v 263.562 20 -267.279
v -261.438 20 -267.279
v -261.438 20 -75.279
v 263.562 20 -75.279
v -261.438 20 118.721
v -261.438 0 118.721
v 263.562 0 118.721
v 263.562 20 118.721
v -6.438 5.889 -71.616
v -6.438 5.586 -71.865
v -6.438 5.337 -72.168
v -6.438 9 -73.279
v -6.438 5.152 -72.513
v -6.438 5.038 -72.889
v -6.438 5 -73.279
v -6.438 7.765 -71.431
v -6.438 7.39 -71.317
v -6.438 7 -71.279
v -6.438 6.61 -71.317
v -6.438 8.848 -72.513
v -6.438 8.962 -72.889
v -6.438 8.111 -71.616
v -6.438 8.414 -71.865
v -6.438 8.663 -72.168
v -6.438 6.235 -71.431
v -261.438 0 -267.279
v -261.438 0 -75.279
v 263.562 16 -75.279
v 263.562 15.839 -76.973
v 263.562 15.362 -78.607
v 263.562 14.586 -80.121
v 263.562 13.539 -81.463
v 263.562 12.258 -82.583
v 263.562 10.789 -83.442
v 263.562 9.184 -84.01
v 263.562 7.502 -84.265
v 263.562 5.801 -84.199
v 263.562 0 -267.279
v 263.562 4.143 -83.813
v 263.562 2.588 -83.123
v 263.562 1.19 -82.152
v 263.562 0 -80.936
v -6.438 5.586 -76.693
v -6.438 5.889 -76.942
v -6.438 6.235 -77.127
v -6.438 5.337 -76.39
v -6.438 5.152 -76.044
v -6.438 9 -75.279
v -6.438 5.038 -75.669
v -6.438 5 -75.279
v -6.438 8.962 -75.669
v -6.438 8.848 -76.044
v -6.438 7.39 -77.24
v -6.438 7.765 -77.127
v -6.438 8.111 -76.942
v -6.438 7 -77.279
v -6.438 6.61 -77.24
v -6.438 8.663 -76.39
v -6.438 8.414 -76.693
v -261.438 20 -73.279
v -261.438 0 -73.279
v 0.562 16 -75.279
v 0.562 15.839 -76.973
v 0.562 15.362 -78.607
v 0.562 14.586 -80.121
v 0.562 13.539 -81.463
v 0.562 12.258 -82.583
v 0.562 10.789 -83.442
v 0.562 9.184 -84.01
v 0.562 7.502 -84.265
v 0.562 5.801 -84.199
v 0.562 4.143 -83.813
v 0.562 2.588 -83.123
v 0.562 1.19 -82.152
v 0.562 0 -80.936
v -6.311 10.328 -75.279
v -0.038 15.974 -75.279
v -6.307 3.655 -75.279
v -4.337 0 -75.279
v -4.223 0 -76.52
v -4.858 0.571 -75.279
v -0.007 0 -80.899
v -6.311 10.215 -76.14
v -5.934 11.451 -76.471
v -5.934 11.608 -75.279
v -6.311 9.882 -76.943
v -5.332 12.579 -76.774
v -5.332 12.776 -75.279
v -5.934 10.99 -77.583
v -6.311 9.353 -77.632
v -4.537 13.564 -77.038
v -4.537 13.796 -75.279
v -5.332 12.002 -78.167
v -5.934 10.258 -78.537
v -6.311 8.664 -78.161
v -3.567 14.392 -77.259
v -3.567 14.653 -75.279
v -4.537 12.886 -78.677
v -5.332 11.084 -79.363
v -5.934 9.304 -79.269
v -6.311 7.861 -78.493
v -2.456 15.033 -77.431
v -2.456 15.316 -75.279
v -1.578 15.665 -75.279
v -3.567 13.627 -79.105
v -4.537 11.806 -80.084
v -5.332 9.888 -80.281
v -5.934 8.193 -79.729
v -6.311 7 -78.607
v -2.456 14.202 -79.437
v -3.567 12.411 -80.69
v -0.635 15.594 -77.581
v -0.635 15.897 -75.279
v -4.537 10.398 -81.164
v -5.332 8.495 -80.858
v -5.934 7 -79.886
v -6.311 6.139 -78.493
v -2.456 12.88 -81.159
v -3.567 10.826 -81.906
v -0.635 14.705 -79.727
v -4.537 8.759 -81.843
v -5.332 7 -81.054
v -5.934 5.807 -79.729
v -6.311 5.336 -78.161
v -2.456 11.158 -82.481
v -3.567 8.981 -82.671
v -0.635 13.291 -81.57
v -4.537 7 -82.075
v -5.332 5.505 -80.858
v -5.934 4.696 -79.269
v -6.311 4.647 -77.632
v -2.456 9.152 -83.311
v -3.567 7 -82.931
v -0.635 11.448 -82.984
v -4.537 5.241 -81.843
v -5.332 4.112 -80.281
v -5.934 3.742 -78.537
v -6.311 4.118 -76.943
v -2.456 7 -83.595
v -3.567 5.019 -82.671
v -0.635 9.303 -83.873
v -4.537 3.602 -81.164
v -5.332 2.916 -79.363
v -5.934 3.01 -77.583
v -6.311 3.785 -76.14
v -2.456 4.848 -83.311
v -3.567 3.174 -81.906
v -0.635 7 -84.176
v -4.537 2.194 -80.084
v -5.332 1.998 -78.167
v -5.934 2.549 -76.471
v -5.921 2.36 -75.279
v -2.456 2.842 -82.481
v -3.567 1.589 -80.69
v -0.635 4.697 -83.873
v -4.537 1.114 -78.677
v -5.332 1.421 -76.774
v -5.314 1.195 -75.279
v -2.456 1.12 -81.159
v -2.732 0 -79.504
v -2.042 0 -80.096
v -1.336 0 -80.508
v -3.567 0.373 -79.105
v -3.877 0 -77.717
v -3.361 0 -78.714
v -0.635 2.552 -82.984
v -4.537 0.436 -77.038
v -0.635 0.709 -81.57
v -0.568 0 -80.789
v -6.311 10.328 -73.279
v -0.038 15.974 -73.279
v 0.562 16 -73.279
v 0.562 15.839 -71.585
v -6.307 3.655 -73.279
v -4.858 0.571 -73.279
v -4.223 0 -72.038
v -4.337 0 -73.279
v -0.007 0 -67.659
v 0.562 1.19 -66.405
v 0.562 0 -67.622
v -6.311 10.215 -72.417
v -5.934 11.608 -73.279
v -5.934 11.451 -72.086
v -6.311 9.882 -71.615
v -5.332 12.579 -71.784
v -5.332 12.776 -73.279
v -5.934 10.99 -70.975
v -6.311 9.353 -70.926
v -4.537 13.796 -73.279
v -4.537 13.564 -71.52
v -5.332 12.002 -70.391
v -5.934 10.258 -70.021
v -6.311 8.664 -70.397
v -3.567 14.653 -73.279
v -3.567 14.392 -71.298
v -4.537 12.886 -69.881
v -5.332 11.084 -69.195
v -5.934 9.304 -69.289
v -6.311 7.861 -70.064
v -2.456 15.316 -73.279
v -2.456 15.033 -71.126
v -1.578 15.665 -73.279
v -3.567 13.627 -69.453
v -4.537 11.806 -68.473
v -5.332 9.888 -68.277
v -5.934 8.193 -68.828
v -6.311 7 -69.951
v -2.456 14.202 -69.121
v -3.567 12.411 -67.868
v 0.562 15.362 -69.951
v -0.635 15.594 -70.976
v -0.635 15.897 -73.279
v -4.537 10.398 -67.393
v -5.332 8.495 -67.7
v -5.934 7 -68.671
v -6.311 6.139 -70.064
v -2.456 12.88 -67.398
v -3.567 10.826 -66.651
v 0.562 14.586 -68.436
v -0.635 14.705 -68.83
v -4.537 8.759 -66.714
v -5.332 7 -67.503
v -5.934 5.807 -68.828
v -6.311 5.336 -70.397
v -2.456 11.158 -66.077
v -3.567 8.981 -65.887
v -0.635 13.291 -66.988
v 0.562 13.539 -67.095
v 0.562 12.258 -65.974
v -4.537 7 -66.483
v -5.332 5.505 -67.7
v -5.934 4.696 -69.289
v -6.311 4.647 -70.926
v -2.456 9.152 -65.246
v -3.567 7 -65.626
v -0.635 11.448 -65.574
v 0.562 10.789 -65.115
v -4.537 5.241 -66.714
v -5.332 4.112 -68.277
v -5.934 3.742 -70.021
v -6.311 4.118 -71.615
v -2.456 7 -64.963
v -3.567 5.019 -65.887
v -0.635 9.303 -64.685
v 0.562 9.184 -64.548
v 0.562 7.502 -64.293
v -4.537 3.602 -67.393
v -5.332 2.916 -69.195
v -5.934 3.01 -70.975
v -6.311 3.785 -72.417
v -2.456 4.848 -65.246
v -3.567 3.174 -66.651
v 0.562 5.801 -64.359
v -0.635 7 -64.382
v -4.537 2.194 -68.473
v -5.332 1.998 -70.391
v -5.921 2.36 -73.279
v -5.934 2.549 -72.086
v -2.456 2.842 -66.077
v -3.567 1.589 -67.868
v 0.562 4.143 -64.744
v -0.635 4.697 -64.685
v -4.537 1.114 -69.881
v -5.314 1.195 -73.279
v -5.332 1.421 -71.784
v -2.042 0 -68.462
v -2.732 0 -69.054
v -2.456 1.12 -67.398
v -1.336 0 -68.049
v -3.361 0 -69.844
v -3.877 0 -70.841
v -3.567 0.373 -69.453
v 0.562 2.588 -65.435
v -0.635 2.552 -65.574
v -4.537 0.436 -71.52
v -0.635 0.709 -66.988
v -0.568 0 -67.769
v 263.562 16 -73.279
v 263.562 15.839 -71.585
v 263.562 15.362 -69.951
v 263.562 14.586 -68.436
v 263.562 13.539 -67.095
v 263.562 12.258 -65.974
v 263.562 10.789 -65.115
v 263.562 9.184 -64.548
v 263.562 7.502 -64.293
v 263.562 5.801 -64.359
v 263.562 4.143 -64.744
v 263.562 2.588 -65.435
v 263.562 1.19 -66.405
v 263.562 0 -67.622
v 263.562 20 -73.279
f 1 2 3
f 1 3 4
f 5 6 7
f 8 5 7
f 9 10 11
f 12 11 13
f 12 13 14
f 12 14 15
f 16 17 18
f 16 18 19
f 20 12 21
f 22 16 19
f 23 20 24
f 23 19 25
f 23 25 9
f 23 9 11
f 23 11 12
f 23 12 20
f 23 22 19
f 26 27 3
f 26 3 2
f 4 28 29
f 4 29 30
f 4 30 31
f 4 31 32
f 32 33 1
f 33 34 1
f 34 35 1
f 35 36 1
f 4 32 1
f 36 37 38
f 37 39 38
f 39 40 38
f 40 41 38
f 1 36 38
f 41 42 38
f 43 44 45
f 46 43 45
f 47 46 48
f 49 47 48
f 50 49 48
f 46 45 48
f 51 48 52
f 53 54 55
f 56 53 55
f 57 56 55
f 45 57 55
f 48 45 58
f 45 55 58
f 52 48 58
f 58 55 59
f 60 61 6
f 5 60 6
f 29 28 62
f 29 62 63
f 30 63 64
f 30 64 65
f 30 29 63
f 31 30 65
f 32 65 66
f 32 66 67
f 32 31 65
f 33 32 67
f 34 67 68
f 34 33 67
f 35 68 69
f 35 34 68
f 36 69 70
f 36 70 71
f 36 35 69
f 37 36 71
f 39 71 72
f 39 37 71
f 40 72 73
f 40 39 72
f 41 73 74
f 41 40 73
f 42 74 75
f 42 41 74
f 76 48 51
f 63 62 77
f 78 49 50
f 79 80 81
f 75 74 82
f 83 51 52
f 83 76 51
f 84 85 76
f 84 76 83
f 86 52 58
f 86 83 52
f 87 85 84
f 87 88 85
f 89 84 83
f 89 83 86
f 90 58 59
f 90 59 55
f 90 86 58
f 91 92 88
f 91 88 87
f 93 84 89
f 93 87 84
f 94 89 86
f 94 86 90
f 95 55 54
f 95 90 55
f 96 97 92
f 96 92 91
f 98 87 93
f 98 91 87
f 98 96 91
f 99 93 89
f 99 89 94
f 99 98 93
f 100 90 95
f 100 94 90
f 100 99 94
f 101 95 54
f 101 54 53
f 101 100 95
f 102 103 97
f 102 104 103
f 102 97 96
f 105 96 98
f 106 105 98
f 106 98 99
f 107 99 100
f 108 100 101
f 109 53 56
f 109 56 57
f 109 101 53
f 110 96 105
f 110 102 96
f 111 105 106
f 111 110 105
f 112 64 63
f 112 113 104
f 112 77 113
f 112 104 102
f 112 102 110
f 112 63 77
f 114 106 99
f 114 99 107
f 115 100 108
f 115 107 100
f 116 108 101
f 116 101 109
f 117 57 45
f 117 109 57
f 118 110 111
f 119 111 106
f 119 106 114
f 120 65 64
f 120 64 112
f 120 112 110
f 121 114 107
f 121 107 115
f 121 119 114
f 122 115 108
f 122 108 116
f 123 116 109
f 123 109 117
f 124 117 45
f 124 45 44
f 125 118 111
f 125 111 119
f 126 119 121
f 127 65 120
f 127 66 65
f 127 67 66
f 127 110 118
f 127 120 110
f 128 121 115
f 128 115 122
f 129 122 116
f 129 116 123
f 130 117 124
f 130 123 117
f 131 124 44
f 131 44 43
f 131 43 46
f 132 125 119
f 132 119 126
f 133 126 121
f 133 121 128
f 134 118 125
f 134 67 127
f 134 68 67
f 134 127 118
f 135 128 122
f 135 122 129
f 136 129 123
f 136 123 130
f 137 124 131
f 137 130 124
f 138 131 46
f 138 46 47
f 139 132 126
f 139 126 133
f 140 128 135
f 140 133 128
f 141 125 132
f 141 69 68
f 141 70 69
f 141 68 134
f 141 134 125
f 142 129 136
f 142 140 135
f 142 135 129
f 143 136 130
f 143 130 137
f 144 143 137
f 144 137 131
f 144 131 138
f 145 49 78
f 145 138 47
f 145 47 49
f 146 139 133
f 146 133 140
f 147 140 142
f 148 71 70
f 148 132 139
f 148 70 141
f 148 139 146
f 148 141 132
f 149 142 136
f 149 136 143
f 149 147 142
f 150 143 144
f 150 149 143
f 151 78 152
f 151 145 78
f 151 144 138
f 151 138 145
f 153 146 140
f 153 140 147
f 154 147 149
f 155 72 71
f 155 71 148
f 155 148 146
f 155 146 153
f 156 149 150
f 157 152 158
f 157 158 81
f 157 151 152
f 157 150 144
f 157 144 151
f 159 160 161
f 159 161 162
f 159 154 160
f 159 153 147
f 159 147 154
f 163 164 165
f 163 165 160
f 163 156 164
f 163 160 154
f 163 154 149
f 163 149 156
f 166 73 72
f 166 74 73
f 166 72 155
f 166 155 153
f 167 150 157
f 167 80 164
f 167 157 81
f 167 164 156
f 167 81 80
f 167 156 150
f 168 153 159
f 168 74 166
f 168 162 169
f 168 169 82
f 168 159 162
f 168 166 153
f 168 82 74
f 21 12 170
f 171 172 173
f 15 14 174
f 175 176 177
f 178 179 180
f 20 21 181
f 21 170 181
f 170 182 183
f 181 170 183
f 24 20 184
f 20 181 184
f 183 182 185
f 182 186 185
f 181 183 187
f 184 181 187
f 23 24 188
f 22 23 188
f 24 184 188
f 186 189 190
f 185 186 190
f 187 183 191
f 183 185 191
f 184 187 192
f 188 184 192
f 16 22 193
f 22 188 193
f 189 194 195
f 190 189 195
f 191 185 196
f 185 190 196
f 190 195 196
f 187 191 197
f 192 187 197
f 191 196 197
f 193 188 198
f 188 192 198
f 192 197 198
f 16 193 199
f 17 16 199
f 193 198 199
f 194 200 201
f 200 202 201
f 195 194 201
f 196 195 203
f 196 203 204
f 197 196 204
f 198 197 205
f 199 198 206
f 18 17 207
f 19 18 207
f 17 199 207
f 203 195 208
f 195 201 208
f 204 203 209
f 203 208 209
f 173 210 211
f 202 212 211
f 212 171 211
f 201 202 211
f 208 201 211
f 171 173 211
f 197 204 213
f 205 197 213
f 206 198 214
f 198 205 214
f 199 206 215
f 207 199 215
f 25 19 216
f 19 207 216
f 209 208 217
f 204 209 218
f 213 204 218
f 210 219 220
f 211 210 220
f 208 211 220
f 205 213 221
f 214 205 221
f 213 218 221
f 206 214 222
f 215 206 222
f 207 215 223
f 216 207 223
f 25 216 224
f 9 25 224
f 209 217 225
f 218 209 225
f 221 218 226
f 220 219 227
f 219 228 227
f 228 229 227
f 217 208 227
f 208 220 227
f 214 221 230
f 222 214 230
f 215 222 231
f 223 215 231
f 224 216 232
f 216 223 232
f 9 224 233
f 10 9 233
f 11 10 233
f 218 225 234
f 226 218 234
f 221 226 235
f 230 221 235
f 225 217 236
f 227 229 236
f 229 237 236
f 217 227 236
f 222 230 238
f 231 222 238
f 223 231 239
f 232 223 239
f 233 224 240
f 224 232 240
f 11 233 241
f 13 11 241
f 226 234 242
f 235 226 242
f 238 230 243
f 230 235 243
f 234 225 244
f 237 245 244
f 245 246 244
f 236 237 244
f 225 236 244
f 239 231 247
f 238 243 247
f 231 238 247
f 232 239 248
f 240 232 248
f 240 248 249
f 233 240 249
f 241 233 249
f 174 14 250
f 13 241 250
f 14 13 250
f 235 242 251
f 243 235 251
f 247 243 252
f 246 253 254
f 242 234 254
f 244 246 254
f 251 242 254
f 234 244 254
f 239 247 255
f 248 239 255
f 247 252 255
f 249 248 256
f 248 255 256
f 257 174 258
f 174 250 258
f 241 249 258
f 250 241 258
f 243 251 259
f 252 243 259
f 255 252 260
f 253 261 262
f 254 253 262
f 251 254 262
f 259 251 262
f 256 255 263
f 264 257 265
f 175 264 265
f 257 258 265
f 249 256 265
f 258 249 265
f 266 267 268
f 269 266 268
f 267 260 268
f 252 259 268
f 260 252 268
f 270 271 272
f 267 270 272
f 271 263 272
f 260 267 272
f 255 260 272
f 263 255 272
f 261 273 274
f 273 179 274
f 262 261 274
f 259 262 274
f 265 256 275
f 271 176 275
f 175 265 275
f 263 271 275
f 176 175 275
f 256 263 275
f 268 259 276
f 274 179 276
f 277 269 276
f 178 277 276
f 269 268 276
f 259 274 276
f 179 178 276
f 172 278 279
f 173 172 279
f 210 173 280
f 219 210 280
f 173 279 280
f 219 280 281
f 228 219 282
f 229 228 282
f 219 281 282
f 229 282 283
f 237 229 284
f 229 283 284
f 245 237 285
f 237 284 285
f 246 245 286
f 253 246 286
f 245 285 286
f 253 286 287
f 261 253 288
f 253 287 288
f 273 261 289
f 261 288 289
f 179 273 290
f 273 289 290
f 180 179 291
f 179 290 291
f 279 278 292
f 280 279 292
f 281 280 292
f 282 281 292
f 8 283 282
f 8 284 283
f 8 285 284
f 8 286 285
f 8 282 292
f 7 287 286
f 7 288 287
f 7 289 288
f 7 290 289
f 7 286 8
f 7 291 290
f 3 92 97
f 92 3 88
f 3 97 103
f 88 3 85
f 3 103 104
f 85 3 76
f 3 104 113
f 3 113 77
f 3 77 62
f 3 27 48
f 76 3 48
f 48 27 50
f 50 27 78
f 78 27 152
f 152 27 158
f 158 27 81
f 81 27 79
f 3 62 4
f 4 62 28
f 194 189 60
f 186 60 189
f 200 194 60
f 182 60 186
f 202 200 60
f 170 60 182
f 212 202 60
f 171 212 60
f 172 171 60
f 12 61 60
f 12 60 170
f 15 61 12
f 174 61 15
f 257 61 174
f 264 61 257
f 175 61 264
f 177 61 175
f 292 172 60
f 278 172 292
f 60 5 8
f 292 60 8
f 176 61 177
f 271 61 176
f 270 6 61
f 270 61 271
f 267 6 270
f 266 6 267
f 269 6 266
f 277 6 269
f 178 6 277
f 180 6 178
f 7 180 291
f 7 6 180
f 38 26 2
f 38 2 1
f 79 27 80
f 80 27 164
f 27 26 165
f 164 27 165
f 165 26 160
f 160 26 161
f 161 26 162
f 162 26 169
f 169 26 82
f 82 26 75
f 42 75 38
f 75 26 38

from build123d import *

# Parameters (mm, degrees)
F0_W     = 525
F0_H     = 192
F1_DEPTH = 20
F3_DEPTH = 270
F4_R     = 7


with BuildPart() as f1:
    # F0 (on Front) → F1 (new body)
    with BuildSketch(Plane.XZ):
        with Locations((1.0621380061, 22.721197979)):
            Rectangle(F0_W, F0_H)
    extrude(amount=-F1_DEPTH)

    # F2 (on face) → F3 (cut)
    with BuildSketch(Plane.YZ.offset(263.5621380061)):
        with BuildLine():
            ThreePointArc((0, -67.6219477715), (4, -81.7640833952), (16, -73.278802021))
            Line((16, -73.278802021), (0, -73.278802021))
            Line((0, -73.278802021), (0, -67.6219477715))
        make_face()
        with BuildLine():
            Line((0, -73.278802021), (16, -73.278802021))
            ThreePointArc((16, -73.278802021), (10, -64.7935206468), (0, -67.6219477715))
            Line((0, -67.6219477715), (0, -73.278802021))
        make_face()
    extrude(amount=-F3_DEPTH, mode=Mode.SUBTRACT)

    # F4
    f4_edges = [f1.edges().sort_by_distance(p)[0] for p in [
        (-6.437862, 10, -64.793521),
    ]]
    fillet(f4_edges, radius=F4_R)


with BuildPart() as f7_1:
    # F7: instance of F1
    add(f1.part.mirror(Plane(origin=(-53.484370932, 25, -74.278802021), x_dir=(1, 0, 0), z_dir=(0, 0, 1))))


solid = Compound([f1.part, f7_1.part])
